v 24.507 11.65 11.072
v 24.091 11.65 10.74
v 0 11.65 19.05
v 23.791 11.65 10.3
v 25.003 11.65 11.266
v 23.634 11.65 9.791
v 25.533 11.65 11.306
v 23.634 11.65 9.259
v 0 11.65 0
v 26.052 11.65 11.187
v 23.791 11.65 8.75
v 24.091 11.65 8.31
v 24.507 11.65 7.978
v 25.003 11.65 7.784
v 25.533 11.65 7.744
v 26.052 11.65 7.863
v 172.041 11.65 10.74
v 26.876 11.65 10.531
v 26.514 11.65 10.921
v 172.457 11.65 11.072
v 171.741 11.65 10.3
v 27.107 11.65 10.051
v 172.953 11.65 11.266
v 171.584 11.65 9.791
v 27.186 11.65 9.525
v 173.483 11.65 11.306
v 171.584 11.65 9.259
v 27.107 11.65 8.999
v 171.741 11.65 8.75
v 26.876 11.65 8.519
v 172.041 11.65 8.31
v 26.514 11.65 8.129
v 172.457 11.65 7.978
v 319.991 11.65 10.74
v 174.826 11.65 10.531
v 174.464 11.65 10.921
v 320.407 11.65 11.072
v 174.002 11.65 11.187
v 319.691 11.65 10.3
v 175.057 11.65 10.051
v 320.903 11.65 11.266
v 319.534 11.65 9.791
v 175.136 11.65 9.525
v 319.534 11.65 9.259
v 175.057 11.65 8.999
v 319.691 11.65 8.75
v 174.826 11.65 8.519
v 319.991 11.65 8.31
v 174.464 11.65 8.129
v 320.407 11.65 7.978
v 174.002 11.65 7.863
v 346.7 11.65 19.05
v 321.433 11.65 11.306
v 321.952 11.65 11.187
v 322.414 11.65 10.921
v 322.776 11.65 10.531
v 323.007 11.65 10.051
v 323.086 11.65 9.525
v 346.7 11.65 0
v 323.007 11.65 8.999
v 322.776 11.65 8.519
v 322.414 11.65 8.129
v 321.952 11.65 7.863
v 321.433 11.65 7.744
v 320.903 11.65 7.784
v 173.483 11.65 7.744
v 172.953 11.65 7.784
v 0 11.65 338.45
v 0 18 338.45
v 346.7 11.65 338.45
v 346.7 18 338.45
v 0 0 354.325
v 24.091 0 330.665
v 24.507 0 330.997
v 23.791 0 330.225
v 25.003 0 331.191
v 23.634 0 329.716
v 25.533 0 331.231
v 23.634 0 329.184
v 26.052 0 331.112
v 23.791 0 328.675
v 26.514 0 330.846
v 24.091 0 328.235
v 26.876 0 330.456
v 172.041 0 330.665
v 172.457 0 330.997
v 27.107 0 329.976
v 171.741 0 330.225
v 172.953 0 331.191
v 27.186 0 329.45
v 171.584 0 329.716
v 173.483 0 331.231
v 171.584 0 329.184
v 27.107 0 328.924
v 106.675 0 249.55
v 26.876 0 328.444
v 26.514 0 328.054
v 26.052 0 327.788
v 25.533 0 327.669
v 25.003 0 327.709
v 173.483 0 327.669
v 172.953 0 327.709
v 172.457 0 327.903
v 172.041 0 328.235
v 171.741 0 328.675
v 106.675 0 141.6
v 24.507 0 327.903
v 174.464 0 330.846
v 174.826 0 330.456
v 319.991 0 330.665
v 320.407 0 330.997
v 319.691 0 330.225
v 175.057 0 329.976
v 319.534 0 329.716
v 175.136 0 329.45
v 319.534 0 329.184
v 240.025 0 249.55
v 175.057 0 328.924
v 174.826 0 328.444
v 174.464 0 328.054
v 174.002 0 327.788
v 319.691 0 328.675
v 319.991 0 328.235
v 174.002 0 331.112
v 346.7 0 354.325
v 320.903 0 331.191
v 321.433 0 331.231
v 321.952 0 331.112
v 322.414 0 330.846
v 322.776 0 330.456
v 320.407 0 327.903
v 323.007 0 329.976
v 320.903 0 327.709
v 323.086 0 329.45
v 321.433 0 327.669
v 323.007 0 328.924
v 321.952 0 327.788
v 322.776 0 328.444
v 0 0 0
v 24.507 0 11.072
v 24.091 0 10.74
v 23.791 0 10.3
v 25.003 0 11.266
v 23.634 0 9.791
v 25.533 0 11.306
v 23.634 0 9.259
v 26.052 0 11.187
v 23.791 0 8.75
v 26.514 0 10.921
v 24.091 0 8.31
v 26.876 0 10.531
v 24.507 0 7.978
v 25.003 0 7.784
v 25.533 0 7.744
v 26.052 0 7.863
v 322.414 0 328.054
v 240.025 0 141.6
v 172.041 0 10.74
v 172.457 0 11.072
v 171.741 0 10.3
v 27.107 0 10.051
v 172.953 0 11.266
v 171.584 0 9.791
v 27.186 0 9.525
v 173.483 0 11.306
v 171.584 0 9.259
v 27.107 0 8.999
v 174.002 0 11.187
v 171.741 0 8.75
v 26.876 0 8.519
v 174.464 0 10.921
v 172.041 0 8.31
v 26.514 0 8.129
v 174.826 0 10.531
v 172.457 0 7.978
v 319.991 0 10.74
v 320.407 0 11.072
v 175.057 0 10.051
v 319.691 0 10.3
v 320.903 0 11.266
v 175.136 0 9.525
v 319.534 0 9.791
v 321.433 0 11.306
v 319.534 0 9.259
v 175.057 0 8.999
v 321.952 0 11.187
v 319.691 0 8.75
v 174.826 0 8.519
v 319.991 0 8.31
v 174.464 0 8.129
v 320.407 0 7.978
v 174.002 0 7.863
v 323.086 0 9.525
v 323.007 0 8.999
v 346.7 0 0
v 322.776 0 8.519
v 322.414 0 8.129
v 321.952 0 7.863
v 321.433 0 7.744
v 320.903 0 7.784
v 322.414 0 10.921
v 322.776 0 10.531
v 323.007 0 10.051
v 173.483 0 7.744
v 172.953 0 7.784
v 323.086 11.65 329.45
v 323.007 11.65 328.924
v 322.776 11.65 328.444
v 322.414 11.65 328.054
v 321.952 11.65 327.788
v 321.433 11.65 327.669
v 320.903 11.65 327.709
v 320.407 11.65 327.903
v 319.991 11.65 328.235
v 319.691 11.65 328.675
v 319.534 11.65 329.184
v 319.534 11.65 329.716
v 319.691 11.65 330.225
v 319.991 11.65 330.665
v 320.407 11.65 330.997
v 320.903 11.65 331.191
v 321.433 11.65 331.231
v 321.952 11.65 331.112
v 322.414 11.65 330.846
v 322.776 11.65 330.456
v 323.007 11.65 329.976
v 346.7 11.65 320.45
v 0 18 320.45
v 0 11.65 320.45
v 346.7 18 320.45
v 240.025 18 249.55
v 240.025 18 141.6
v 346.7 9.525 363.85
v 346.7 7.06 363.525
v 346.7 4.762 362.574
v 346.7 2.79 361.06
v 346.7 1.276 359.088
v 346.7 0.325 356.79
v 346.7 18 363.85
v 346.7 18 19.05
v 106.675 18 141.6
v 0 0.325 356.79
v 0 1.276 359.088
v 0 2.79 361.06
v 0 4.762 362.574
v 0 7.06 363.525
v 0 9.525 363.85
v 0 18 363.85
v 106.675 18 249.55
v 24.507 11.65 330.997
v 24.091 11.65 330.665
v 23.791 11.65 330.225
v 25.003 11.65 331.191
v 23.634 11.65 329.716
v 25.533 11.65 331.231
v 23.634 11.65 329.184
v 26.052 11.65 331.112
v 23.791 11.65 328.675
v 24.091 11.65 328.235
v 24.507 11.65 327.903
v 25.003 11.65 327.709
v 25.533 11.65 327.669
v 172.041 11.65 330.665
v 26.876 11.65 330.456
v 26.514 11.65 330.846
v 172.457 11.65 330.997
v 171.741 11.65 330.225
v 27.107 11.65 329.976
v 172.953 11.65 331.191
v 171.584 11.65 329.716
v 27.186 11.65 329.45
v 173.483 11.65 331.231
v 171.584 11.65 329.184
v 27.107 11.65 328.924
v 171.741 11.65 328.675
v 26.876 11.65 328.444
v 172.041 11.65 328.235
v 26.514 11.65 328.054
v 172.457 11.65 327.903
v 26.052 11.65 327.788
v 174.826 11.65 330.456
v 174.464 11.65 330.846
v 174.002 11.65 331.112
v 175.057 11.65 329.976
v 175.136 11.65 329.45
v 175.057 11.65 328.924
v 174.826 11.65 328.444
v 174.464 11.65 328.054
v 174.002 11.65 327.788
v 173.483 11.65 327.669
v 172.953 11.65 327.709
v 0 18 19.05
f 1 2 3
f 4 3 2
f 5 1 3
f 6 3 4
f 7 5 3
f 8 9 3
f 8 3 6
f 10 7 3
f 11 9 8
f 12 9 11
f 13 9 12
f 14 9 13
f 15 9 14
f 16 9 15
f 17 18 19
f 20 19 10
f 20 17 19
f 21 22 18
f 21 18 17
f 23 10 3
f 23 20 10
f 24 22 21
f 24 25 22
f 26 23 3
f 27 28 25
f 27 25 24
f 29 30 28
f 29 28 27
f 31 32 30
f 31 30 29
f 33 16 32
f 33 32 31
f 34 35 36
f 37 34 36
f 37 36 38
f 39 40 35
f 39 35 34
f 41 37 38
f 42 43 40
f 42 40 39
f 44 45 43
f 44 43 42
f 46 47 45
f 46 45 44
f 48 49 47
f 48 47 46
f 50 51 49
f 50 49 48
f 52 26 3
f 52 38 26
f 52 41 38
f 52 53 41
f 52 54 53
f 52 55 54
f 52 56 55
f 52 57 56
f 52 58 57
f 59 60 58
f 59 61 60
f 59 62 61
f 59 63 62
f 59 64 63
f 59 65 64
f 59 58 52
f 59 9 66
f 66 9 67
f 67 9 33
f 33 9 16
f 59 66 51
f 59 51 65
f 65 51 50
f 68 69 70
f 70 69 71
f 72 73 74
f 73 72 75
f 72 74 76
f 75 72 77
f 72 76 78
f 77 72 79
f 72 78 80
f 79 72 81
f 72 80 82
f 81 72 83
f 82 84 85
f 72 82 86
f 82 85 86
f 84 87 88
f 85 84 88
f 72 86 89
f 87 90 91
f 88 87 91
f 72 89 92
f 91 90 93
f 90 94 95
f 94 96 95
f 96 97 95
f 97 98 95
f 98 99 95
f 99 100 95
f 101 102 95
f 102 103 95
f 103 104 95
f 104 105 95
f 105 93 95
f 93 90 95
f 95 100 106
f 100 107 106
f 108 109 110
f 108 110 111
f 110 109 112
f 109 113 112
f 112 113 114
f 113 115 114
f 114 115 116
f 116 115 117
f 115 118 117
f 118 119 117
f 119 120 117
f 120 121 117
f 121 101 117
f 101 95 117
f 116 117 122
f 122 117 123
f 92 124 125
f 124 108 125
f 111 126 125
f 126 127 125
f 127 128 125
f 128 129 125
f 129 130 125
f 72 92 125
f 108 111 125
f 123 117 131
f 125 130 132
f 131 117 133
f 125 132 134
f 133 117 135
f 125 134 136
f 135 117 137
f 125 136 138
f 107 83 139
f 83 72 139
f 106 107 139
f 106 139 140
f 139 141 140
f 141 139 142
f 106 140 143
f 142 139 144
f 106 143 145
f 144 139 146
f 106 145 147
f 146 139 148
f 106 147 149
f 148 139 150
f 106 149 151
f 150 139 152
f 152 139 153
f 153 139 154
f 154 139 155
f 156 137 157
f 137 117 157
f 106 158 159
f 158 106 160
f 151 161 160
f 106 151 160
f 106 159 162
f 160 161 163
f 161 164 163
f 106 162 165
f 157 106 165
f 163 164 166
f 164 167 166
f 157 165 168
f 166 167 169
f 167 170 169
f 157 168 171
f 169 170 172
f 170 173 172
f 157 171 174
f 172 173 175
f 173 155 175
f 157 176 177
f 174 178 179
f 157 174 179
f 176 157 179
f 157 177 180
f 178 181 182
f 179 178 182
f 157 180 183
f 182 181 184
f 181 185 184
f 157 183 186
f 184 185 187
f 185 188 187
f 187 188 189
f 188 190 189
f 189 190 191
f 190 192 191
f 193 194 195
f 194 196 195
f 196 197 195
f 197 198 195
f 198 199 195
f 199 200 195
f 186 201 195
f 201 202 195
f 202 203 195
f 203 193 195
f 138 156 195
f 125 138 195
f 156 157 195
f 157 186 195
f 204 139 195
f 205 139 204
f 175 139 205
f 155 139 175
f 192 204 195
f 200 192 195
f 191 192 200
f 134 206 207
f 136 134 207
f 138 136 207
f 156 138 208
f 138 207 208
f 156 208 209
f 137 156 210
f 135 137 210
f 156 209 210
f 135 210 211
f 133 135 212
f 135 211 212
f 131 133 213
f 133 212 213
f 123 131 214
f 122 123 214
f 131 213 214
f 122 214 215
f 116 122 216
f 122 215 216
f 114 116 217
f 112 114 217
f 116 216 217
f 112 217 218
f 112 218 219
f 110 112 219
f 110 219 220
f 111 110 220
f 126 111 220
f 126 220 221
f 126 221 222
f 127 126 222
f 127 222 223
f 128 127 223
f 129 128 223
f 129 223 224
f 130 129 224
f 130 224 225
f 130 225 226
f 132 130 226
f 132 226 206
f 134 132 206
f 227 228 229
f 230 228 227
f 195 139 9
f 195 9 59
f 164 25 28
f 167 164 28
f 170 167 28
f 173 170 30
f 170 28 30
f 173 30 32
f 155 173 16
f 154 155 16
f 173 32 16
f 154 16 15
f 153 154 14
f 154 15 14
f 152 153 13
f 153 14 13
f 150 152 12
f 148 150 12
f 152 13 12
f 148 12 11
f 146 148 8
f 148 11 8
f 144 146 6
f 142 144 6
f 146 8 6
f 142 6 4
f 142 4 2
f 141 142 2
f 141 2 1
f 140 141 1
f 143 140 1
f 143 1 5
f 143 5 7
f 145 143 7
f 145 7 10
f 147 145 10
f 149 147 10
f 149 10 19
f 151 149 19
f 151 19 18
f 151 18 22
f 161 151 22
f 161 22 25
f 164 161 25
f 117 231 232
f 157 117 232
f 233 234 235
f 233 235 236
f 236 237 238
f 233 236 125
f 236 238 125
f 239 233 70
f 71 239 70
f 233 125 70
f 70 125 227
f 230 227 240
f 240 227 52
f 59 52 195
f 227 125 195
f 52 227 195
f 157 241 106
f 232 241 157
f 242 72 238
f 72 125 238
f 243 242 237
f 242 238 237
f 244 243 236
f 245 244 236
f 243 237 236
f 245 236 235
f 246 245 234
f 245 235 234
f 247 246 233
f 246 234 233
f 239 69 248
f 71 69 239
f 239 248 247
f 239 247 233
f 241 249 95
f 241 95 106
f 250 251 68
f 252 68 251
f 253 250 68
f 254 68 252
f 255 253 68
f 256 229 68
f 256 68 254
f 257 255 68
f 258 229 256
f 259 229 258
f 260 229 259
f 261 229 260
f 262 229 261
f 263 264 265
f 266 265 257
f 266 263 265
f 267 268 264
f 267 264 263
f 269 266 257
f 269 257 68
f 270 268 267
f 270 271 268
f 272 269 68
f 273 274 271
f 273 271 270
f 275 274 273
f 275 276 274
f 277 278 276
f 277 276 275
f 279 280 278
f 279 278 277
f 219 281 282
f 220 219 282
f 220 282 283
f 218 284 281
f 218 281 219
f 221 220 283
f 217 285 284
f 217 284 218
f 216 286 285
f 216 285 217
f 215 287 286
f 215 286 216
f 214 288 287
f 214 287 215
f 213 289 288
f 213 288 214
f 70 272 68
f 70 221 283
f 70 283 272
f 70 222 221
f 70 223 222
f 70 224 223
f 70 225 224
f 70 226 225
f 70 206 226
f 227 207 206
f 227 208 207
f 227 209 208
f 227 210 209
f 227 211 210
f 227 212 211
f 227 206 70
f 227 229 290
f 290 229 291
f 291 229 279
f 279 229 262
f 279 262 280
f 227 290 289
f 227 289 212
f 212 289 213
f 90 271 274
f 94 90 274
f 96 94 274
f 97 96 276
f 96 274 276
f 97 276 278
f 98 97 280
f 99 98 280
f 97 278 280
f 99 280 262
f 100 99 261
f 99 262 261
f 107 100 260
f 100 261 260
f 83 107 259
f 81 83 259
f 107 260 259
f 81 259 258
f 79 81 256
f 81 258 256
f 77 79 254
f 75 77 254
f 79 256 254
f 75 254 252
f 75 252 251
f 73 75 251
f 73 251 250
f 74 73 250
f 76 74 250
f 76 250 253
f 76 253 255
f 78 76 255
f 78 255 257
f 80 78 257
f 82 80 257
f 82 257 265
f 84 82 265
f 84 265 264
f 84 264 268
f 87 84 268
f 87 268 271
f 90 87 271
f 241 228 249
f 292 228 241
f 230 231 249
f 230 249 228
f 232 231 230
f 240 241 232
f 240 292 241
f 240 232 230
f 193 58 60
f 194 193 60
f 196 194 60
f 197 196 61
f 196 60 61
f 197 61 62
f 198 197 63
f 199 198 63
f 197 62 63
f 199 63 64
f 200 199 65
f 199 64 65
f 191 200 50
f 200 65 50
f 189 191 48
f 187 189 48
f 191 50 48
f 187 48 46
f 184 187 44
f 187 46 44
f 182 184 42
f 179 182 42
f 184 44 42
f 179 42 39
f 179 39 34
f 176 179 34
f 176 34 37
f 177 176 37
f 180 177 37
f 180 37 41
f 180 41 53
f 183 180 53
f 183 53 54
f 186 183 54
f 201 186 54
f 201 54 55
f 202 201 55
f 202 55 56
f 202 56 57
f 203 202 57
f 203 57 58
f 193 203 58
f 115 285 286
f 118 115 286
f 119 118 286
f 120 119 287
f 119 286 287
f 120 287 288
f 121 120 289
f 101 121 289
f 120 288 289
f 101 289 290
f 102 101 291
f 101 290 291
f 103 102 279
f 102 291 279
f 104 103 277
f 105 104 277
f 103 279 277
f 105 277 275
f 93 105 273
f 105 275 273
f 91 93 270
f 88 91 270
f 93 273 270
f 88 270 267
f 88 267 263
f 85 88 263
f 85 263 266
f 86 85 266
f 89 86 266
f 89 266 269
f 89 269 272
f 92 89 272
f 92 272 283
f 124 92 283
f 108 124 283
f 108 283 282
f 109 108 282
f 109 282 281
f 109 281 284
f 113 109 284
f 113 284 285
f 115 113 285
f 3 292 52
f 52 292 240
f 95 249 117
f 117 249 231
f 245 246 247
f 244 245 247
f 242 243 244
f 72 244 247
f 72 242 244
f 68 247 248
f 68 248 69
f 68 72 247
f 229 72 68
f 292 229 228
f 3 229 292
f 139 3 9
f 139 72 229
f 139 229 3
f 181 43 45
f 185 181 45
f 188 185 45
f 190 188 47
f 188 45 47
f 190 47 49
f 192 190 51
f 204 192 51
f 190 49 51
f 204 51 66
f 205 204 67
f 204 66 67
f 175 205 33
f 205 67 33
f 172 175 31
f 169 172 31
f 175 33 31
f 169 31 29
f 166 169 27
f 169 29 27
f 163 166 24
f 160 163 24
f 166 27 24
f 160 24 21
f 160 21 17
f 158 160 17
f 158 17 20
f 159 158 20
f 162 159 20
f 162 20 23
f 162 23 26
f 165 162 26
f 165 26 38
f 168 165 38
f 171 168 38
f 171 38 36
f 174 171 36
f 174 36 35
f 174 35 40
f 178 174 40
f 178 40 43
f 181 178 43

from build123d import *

# Parameters (mm, degrees)
SKETCH1_W           = 346.7
SKETCH1_H           = 376.55000001
BOSS_EXTRUDE1_DEPTH = 18
SKETCH2_W           = 346.7
SKETCH2_H           = 18
CUT_EXTRUDE1_DEPTH  = 6.35
SKETCH3_W           = 133.35
SKETCH3_H           = 107.95
CUT_EXTRUDE3_DEPTH  = 19
FILLET1_R           = 9.525
SKETCH6_W           = 346.7
SKETCH6_H           = 19.05
CUT_EXTRUDE4_DEPTH  = 6.35
SKETCH7_W           = 346.7
SKETCH7_H           = 12.7
CUT_EXTRUDE5_DEPTH  = 19
FILLET2_R           = 9.525
SKETCH8_R           = 1.7859375
CUT_EXTRUDE6_DEPTH  = 12.65


with BuildPart() as part:
    # Sketch1 → Boss-Extrude1 (new body)
    with BuildSketch(Plane(origin=(0, 0, 0), x_dir=(1, 0, 0), z_dir=(0, 1, 0))):
        with Locations((173.35, -188.275000005)):
            Rectangle(SKETCH1_W, SKETCH1_H)
    extrude(amount=BOSS_EXTRUDE1_DEPTH)

    # Sketch2 → Cut-Extrude1 (cut)
    with BuildSketch(Plane(origin=(0, 18, 0), x_dir=(1, 0, 0), z_dir=(0, 1, 0))):
        with Locations((173.35, -329.45000001)):
            Rectangle(SKETCH2_W, SKETCH2_H)
    extrude(amount=-CUT_EXTRUDE1_DEPTH, mode=Mode.SUBTRACT)

    # Sketch3 → Cut-Extrude3 (cut, through all)
    with BuildSketch(Plane(origin=(0, 18, 0), x_dir=(1, 0, 0), z_dir=(0, 1, 0))):
        with Locations((173.35, -195.57500001)):
            Rectangle(SKETCH3_W, SKETCH3_H)
    extrude(amount=-CUT_EXTRUDE3_DEPTH, mode=Mode.SUBTRACT)

    # Fillet1
    fillet1_edges = [part.edges().sort_by_distance(p)[0] for p in [
        (173.35, 0, 376.55000001),
    ]]
    fillet(fillet1_edges, radius=FILLET1_R)

    # Sketch6 → Cut-Extrude4 (cut)
    with BuildSketch(Plane(origin=(0, 18, 0), x_dir=(1, 0, 0), z_dir=(0, 1, 0))):
        with Locations((173.35, -9.525)):
            Rectangle(SKETCH6_W, SKETCH6_H)
    extrude(amount=-CUT_EXTRUDE4_DEPTH, mode=Mode.SUBTRACT)

    # Sketch7 → Cut-Extrude5 (cut, through all)
    with BuildSketch(Plane(origin=(0, 18, 0), x_dir=(1, 0, 0), z_dir=(0, 1, 0))):
        with Locations((173.35, -370.20000001)):
            Rectangle(SKETCH7_W, SKETCH7_H)
    extrude(amount=-CUT_EXTRUDE5_DEPTH, mode=Mode.SUBTRACT)

    # Fillet2
    fillet2_edges = [part.edges().sort_by_distance(p)[0] for p in [
        (173.35, 0, 363.85000001),
    ]]
    fillet(fillet2_edges, radius=FILLET2_R)

    # Sketch8 → Cut-Extrude6 (cut, through all)
    with BuildSketch(Plane(origin=(0, 11.65, 0), x_dir=(1, 0, 0), z_dir=(0, 1, 0))):
        with Locations((173.35, -9.525)):
            Circle(SKETCH8_R)
        with Locations((173.35, -329.45000001)):
            Circle(SKETCH8_R)
        with Locations((25.4, -329.45000001)):
            Circle(SKETCH8_R)
        with Locations((321.3, -329.45000001)):
            Circle(SKETCH8_R)
        with Locations((321.3, -9.525)):
            Circle(SKETCH8_R)
        with Locations((25.4, -9.525)):
            Circle(SKETCH8_R)
    extrude(amount=-CUT_EXTRUDE6_DEPTH, mode=Mode.SUBTRACT)


solid = part.part
